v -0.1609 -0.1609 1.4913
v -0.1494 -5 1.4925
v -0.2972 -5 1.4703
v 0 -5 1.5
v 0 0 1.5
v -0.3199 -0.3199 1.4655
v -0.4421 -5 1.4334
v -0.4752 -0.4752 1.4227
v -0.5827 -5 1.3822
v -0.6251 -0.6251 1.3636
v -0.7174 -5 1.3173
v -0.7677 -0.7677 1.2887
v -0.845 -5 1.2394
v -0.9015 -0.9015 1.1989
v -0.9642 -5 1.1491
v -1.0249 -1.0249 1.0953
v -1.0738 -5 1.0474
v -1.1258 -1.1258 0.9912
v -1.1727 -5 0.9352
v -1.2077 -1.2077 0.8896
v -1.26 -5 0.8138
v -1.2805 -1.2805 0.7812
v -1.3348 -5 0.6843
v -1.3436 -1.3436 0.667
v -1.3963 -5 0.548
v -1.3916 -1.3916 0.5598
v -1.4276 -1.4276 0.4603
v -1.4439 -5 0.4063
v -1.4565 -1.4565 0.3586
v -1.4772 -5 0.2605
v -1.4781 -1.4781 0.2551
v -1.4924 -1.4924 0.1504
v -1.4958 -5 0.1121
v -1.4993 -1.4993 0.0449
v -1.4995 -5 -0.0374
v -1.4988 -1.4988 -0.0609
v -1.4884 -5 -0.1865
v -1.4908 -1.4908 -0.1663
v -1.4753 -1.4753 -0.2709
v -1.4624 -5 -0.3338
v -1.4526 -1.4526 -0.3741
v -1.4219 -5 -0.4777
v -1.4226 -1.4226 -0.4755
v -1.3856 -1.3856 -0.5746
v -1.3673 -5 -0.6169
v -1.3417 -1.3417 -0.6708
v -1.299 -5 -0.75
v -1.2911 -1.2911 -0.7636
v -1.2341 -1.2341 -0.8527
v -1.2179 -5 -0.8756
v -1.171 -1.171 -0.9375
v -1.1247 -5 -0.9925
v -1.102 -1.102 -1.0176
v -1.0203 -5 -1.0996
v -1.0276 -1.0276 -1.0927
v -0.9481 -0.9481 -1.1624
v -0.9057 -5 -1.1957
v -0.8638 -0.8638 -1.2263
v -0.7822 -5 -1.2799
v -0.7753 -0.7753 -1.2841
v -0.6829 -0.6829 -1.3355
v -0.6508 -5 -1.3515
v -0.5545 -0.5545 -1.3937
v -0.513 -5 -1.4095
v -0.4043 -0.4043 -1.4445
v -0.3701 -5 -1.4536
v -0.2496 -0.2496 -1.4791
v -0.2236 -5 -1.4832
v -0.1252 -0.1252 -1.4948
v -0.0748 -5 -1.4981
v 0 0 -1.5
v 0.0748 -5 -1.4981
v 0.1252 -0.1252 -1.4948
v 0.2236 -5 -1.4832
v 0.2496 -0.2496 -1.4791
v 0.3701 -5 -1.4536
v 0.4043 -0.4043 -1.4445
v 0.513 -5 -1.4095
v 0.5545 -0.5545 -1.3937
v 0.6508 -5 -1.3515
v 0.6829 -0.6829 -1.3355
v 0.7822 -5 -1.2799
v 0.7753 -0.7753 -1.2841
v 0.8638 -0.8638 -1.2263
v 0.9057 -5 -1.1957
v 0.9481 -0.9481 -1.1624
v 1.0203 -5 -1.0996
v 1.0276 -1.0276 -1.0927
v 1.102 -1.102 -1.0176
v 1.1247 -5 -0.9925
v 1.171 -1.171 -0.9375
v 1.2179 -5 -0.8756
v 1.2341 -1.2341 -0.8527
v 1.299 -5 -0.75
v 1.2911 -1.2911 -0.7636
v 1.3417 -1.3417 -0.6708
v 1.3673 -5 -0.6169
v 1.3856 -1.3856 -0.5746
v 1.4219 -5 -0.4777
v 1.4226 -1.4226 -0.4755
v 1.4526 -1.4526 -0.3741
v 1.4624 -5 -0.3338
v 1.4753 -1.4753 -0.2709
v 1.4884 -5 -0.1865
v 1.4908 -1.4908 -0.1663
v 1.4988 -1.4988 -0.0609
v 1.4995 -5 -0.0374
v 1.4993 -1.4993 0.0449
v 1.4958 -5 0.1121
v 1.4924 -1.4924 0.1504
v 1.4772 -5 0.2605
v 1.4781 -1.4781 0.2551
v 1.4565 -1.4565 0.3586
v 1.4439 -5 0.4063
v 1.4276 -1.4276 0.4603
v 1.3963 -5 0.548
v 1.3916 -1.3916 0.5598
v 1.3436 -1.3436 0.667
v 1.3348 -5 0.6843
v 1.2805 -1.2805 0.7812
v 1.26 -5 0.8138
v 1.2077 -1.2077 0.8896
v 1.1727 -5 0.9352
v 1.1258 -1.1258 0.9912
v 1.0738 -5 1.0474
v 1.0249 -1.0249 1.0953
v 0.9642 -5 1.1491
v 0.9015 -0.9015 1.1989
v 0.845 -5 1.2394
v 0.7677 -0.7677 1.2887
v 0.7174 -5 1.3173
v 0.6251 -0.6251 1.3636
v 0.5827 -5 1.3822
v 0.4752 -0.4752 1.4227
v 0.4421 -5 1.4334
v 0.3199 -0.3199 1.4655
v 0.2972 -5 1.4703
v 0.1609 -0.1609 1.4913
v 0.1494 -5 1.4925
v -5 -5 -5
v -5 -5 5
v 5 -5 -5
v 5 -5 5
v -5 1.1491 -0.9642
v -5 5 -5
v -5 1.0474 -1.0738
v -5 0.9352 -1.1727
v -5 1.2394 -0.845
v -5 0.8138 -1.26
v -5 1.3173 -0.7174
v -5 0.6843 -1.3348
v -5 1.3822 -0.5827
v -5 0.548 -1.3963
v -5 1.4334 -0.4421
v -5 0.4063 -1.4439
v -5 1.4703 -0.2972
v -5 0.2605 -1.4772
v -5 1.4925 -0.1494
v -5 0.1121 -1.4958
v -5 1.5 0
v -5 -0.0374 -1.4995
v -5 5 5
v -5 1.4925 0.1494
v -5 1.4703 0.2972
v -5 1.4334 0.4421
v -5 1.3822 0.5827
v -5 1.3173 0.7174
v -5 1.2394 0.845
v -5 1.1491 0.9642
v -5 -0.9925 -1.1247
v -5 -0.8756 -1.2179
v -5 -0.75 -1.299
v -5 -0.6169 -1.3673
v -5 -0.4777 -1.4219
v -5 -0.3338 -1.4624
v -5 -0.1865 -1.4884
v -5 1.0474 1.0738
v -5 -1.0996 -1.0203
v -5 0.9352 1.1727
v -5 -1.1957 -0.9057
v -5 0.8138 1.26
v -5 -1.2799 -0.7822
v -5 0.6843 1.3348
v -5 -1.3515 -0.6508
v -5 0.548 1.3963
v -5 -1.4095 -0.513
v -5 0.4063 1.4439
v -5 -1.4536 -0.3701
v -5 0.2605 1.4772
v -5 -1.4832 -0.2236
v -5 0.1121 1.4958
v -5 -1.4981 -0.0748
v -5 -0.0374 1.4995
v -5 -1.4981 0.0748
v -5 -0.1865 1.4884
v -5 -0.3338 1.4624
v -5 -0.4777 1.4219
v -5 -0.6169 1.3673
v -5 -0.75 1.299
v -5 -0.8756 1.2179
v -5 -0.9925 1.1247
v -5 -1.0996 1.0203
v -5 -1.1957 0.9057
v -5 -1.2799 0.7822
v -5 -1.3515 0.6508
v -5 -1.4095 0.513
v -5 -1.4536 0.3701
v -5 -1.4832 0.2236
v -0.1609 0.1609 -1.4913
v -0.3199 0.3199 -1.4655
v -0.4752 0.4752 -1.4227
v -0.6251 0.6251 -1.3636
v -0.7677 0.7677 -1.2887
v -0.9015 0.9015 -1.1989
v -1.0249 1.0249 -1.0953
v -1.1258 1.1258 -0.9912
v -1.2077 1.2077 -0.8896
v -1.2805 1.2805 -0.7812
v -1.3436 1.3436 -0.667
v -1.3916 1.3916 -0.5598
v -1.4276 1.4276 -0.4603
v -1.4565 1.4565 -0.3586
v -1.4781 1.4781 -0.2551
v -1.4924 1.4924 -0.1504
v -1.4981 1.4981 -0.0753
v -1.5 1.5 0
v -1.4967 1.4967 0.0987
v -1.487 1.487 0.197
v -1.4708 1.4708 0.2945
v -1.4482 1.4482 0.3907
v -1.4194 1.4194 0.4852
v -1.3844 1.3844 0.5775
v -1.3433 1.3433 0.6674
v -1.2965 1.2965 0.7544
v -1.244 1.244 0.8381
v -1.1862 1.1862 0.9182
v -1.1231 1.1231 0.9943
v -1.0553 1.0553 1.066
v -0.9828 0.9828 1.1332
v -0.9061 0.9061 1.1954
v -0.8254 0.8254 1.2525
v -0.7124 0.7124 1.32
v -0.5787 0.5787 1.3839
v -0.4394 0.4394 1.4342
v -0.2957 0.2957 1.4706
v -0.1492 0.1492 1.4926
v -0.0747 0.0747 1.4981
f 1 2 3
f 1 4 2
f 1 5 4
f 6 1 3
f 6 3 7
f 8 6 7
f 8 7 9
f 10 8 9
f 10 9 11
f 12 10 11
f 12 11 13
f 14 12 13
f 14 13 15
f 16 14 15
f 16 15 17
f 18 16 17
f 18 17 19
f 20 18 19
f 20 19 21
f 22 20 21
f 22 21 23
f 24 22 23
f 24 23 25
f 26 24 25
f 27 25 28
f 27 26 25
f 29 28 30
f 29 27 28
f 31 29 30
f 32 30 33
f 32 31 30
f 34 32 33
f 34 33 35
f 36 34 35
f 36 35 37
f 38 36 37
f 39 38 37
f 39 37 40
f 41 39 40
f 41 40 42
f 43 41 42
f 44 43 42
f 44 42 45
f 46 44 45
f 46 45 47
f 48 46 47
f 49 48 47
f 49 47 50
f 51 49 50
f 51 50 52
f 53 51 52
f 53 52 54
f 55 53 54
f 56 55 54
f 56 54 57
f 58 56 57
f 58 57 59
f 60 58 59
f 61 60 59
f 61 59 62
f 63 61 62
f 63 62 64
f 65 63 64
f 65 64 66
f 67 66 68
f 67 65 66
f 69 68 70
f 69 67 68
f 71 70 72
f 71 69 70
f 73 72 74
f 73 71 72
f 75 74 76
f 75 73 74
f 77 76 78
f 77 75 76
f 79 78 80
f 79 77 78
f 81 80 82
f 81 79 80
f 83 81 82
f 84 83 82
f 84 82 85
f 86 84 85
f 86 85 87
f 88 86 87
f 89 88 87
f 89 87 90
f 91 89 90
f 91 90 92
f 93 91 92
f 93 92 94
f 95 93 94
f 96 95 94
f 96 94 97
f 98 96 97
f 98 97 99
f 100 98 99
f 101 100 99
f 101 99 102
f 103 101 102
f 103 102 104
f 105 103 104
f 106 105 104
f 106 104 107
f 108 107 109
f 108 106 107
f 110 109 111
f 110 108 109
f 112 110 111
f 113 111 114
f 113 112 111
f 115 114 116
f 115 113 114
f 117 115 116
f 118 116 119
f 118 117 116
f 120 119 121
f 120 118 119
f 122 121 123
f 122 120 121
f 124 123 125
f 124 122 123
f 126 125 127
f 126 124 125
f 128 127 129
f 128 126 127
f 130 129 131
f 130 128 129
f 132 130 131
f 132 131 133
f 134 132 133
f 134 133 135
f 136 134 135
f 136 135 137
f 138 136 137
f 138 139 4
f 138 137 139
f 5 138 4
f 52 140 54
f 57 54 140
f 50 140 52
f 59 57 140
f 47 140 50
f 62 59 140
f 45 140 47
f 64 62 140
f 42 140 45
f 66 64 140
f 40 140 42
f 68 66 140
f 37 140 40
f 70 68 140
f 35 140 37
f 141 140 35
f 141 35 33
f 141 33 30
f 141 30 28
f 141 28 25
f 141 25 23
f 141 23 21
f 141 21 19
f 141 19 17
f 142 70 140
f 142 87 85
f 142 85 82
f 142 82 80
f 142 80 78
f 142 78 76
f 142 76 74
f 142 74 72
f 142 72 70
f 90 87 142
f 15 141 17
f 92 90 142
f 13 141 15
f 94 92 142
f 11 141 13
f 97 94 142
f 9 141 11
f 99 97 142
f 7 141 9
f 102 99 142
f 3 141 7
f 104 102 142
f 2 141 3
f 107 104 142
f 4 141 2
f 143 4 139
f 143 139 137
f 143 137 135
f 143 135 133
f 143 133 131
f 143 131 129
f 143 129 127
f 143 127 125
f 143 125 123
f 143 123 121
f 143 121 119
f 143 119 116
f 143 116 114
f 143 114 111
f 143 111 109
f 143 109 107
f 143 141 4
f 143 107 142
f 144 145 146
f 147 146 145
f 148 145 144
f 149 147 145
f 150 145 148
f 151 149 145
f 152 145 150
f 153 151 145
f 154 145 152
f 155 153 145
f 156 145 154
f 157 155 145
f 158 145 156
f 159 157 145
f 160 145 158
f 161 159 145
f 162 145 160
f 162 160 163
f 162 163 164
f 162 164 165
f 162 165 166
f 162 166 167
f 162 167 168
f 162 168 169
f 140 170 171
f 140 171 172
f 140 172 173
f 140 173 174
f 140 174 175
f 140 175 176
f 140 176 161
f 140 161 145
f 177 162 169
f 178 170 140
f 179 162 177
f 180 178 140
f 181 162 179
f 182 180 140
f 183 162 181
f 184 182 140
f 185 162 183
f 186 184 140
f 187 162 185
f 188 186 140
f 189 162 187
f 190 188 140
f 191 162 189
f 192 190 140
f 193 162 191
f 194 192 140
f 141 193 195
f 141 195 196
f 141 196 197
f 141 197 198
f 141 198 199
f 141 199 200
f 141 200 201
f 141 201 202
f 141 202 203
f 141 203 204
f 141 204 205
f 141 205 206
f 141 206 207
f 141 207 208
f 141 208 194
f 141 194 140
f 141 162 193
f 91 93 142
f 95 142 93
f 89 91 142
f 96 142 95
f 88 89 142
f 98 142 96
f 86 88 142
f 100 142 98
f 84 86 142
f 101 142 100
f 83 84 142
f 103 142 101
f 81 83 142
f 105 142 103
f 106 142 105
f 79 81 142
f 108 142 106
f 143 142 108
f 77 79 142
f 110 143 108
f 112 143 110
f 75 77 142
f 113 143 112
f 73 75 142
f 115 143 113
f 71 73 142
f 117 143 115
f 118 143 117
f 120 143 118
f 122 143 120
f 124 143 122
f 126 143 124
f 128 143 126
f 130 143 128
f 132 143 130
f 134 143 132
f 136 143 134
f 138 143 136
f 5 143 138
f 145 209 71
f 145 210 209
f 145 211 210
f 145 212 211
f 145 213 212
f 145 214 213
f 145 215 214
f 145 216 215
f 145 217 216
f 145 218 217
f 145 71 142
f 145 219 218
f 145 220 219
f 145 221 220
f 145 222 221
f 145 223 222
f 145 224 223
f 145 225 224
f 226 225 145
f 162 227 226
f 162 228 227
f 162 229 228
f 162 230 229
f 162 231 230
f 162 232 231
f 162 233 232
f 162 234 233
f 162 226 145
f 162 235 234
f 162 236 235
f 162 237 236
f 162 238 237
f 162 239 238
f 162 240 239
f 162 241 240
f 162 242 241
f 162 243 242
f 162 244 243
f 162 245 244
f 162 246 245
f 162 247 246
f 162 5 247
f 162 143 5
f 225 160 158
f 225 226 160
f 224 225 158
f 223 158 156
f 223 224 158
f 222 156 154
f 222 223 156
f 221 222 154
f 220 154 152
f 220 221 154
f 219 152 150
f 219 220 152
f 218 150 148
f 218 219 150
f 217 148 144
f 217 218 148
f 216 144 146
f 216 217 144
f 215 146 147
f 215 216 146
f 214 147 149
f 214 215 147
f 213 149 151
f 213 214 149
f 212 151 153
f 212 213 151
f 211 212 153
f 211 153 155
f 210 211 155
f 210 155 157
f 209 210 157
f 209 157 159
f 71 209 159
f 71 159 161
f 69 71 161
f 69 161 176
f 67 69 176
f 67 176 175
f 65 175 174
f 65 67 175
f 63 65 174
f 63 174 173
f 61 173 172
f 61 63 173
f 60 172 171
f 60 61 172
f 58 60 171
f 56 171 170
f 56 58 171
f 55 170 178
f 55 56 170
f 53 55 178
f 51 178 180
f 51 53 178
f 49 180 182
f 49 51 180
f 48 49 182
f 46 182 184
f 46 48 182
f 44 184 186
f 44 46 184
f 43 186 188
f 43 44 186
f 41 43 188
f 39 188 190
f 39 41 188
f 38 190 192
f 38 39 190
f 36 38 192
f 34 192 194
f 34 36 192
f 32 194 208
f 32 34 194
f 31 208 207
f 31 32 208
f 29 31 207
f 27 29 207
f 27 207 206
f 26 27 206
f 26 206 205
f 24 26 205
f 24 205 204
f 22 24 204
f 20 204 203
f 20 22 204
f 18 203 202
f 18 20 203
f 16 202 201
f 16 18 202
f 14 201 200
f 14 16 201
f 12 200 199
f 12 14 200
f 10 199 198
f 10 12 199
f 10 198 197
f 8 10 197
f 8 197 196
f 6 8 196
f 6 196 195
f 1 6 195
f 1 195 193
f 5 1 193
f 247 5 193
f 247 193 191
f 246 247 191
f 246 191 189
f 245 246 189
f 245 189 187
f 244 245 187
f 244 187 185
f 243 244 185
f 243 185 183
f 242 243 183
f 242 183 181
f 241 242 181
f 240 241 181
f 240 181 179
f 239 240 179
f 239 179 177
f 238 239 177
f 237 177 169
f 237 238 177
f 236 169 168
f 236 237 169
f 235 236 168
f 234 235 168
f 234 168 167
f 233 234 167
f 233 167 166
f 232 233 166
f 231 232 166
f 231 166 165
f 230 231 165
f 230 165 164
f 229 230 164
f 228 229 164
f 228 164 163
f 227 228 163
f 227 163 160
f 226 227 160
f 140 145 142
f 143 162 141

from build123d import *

# Parameters (mm, degrees)
EXTRUDE_1_DEPTH          = 5
CUT_EXTRUDE_1_DEPTH      = 13.247448714
CUT_EXTRUDE_1_DEPTH_BACK = 13.247448714
SKETCH_2_R               = 1.5
CUT_EXTRUDE_2_DEPTH      = 13.247448714
CUT_EXTRUDE_2_DEPTH_BACK = 13.247448714
SKETCH_3_R               = 1.5


with BuildPart() as part:
    # 草图1 → 凸台-拉伸1 (new, symmetric)
    with BuildSketch(Plane.XY):
        Polygon((-5, 5), (-5, -5), (5, -5), align=None)
    extrude(amount=EXTRUDE_1_DEPTH, both=True)

    # 草图2 → 切除-拉伸1 (cut, two sides: drawn at the far end of the back side and taken through both)
    with BuildSketch(Plane.ZY.offset(5).offset(-CUT_EXTRUDE_1_DEPTH_BACK)):
        with Locations(Location((0, 0, 0), (0, 0, 90))):
            Circle(SKETCH_2_R)
    extrude(amount=CUT_EXTRUDE_1_DEPTH + CUT_EXTRUDE_1_DEPTH_BACK, mode=Mode.SUBTRACT)

    # 草图3 → 切除-拉伸2 (cut, two sides: drawn at the far end of the back side and taken through both)
    with BuildSketch(Plane.XZ.offset(5).offset(-CUT_EXTRUDE_2_DEPTH_BACK)):
        with Locations(Location((0, 0, 0), (0, 0, 90))):
            Circle(SKETCH_3_R)
    extrude(amount=CUT_EXTRUDE_2_DEPTH + CUT_EXTRUDE_2_DEPTH_BACK, mode=Mode.SUBTRACT)


solid = part.part
